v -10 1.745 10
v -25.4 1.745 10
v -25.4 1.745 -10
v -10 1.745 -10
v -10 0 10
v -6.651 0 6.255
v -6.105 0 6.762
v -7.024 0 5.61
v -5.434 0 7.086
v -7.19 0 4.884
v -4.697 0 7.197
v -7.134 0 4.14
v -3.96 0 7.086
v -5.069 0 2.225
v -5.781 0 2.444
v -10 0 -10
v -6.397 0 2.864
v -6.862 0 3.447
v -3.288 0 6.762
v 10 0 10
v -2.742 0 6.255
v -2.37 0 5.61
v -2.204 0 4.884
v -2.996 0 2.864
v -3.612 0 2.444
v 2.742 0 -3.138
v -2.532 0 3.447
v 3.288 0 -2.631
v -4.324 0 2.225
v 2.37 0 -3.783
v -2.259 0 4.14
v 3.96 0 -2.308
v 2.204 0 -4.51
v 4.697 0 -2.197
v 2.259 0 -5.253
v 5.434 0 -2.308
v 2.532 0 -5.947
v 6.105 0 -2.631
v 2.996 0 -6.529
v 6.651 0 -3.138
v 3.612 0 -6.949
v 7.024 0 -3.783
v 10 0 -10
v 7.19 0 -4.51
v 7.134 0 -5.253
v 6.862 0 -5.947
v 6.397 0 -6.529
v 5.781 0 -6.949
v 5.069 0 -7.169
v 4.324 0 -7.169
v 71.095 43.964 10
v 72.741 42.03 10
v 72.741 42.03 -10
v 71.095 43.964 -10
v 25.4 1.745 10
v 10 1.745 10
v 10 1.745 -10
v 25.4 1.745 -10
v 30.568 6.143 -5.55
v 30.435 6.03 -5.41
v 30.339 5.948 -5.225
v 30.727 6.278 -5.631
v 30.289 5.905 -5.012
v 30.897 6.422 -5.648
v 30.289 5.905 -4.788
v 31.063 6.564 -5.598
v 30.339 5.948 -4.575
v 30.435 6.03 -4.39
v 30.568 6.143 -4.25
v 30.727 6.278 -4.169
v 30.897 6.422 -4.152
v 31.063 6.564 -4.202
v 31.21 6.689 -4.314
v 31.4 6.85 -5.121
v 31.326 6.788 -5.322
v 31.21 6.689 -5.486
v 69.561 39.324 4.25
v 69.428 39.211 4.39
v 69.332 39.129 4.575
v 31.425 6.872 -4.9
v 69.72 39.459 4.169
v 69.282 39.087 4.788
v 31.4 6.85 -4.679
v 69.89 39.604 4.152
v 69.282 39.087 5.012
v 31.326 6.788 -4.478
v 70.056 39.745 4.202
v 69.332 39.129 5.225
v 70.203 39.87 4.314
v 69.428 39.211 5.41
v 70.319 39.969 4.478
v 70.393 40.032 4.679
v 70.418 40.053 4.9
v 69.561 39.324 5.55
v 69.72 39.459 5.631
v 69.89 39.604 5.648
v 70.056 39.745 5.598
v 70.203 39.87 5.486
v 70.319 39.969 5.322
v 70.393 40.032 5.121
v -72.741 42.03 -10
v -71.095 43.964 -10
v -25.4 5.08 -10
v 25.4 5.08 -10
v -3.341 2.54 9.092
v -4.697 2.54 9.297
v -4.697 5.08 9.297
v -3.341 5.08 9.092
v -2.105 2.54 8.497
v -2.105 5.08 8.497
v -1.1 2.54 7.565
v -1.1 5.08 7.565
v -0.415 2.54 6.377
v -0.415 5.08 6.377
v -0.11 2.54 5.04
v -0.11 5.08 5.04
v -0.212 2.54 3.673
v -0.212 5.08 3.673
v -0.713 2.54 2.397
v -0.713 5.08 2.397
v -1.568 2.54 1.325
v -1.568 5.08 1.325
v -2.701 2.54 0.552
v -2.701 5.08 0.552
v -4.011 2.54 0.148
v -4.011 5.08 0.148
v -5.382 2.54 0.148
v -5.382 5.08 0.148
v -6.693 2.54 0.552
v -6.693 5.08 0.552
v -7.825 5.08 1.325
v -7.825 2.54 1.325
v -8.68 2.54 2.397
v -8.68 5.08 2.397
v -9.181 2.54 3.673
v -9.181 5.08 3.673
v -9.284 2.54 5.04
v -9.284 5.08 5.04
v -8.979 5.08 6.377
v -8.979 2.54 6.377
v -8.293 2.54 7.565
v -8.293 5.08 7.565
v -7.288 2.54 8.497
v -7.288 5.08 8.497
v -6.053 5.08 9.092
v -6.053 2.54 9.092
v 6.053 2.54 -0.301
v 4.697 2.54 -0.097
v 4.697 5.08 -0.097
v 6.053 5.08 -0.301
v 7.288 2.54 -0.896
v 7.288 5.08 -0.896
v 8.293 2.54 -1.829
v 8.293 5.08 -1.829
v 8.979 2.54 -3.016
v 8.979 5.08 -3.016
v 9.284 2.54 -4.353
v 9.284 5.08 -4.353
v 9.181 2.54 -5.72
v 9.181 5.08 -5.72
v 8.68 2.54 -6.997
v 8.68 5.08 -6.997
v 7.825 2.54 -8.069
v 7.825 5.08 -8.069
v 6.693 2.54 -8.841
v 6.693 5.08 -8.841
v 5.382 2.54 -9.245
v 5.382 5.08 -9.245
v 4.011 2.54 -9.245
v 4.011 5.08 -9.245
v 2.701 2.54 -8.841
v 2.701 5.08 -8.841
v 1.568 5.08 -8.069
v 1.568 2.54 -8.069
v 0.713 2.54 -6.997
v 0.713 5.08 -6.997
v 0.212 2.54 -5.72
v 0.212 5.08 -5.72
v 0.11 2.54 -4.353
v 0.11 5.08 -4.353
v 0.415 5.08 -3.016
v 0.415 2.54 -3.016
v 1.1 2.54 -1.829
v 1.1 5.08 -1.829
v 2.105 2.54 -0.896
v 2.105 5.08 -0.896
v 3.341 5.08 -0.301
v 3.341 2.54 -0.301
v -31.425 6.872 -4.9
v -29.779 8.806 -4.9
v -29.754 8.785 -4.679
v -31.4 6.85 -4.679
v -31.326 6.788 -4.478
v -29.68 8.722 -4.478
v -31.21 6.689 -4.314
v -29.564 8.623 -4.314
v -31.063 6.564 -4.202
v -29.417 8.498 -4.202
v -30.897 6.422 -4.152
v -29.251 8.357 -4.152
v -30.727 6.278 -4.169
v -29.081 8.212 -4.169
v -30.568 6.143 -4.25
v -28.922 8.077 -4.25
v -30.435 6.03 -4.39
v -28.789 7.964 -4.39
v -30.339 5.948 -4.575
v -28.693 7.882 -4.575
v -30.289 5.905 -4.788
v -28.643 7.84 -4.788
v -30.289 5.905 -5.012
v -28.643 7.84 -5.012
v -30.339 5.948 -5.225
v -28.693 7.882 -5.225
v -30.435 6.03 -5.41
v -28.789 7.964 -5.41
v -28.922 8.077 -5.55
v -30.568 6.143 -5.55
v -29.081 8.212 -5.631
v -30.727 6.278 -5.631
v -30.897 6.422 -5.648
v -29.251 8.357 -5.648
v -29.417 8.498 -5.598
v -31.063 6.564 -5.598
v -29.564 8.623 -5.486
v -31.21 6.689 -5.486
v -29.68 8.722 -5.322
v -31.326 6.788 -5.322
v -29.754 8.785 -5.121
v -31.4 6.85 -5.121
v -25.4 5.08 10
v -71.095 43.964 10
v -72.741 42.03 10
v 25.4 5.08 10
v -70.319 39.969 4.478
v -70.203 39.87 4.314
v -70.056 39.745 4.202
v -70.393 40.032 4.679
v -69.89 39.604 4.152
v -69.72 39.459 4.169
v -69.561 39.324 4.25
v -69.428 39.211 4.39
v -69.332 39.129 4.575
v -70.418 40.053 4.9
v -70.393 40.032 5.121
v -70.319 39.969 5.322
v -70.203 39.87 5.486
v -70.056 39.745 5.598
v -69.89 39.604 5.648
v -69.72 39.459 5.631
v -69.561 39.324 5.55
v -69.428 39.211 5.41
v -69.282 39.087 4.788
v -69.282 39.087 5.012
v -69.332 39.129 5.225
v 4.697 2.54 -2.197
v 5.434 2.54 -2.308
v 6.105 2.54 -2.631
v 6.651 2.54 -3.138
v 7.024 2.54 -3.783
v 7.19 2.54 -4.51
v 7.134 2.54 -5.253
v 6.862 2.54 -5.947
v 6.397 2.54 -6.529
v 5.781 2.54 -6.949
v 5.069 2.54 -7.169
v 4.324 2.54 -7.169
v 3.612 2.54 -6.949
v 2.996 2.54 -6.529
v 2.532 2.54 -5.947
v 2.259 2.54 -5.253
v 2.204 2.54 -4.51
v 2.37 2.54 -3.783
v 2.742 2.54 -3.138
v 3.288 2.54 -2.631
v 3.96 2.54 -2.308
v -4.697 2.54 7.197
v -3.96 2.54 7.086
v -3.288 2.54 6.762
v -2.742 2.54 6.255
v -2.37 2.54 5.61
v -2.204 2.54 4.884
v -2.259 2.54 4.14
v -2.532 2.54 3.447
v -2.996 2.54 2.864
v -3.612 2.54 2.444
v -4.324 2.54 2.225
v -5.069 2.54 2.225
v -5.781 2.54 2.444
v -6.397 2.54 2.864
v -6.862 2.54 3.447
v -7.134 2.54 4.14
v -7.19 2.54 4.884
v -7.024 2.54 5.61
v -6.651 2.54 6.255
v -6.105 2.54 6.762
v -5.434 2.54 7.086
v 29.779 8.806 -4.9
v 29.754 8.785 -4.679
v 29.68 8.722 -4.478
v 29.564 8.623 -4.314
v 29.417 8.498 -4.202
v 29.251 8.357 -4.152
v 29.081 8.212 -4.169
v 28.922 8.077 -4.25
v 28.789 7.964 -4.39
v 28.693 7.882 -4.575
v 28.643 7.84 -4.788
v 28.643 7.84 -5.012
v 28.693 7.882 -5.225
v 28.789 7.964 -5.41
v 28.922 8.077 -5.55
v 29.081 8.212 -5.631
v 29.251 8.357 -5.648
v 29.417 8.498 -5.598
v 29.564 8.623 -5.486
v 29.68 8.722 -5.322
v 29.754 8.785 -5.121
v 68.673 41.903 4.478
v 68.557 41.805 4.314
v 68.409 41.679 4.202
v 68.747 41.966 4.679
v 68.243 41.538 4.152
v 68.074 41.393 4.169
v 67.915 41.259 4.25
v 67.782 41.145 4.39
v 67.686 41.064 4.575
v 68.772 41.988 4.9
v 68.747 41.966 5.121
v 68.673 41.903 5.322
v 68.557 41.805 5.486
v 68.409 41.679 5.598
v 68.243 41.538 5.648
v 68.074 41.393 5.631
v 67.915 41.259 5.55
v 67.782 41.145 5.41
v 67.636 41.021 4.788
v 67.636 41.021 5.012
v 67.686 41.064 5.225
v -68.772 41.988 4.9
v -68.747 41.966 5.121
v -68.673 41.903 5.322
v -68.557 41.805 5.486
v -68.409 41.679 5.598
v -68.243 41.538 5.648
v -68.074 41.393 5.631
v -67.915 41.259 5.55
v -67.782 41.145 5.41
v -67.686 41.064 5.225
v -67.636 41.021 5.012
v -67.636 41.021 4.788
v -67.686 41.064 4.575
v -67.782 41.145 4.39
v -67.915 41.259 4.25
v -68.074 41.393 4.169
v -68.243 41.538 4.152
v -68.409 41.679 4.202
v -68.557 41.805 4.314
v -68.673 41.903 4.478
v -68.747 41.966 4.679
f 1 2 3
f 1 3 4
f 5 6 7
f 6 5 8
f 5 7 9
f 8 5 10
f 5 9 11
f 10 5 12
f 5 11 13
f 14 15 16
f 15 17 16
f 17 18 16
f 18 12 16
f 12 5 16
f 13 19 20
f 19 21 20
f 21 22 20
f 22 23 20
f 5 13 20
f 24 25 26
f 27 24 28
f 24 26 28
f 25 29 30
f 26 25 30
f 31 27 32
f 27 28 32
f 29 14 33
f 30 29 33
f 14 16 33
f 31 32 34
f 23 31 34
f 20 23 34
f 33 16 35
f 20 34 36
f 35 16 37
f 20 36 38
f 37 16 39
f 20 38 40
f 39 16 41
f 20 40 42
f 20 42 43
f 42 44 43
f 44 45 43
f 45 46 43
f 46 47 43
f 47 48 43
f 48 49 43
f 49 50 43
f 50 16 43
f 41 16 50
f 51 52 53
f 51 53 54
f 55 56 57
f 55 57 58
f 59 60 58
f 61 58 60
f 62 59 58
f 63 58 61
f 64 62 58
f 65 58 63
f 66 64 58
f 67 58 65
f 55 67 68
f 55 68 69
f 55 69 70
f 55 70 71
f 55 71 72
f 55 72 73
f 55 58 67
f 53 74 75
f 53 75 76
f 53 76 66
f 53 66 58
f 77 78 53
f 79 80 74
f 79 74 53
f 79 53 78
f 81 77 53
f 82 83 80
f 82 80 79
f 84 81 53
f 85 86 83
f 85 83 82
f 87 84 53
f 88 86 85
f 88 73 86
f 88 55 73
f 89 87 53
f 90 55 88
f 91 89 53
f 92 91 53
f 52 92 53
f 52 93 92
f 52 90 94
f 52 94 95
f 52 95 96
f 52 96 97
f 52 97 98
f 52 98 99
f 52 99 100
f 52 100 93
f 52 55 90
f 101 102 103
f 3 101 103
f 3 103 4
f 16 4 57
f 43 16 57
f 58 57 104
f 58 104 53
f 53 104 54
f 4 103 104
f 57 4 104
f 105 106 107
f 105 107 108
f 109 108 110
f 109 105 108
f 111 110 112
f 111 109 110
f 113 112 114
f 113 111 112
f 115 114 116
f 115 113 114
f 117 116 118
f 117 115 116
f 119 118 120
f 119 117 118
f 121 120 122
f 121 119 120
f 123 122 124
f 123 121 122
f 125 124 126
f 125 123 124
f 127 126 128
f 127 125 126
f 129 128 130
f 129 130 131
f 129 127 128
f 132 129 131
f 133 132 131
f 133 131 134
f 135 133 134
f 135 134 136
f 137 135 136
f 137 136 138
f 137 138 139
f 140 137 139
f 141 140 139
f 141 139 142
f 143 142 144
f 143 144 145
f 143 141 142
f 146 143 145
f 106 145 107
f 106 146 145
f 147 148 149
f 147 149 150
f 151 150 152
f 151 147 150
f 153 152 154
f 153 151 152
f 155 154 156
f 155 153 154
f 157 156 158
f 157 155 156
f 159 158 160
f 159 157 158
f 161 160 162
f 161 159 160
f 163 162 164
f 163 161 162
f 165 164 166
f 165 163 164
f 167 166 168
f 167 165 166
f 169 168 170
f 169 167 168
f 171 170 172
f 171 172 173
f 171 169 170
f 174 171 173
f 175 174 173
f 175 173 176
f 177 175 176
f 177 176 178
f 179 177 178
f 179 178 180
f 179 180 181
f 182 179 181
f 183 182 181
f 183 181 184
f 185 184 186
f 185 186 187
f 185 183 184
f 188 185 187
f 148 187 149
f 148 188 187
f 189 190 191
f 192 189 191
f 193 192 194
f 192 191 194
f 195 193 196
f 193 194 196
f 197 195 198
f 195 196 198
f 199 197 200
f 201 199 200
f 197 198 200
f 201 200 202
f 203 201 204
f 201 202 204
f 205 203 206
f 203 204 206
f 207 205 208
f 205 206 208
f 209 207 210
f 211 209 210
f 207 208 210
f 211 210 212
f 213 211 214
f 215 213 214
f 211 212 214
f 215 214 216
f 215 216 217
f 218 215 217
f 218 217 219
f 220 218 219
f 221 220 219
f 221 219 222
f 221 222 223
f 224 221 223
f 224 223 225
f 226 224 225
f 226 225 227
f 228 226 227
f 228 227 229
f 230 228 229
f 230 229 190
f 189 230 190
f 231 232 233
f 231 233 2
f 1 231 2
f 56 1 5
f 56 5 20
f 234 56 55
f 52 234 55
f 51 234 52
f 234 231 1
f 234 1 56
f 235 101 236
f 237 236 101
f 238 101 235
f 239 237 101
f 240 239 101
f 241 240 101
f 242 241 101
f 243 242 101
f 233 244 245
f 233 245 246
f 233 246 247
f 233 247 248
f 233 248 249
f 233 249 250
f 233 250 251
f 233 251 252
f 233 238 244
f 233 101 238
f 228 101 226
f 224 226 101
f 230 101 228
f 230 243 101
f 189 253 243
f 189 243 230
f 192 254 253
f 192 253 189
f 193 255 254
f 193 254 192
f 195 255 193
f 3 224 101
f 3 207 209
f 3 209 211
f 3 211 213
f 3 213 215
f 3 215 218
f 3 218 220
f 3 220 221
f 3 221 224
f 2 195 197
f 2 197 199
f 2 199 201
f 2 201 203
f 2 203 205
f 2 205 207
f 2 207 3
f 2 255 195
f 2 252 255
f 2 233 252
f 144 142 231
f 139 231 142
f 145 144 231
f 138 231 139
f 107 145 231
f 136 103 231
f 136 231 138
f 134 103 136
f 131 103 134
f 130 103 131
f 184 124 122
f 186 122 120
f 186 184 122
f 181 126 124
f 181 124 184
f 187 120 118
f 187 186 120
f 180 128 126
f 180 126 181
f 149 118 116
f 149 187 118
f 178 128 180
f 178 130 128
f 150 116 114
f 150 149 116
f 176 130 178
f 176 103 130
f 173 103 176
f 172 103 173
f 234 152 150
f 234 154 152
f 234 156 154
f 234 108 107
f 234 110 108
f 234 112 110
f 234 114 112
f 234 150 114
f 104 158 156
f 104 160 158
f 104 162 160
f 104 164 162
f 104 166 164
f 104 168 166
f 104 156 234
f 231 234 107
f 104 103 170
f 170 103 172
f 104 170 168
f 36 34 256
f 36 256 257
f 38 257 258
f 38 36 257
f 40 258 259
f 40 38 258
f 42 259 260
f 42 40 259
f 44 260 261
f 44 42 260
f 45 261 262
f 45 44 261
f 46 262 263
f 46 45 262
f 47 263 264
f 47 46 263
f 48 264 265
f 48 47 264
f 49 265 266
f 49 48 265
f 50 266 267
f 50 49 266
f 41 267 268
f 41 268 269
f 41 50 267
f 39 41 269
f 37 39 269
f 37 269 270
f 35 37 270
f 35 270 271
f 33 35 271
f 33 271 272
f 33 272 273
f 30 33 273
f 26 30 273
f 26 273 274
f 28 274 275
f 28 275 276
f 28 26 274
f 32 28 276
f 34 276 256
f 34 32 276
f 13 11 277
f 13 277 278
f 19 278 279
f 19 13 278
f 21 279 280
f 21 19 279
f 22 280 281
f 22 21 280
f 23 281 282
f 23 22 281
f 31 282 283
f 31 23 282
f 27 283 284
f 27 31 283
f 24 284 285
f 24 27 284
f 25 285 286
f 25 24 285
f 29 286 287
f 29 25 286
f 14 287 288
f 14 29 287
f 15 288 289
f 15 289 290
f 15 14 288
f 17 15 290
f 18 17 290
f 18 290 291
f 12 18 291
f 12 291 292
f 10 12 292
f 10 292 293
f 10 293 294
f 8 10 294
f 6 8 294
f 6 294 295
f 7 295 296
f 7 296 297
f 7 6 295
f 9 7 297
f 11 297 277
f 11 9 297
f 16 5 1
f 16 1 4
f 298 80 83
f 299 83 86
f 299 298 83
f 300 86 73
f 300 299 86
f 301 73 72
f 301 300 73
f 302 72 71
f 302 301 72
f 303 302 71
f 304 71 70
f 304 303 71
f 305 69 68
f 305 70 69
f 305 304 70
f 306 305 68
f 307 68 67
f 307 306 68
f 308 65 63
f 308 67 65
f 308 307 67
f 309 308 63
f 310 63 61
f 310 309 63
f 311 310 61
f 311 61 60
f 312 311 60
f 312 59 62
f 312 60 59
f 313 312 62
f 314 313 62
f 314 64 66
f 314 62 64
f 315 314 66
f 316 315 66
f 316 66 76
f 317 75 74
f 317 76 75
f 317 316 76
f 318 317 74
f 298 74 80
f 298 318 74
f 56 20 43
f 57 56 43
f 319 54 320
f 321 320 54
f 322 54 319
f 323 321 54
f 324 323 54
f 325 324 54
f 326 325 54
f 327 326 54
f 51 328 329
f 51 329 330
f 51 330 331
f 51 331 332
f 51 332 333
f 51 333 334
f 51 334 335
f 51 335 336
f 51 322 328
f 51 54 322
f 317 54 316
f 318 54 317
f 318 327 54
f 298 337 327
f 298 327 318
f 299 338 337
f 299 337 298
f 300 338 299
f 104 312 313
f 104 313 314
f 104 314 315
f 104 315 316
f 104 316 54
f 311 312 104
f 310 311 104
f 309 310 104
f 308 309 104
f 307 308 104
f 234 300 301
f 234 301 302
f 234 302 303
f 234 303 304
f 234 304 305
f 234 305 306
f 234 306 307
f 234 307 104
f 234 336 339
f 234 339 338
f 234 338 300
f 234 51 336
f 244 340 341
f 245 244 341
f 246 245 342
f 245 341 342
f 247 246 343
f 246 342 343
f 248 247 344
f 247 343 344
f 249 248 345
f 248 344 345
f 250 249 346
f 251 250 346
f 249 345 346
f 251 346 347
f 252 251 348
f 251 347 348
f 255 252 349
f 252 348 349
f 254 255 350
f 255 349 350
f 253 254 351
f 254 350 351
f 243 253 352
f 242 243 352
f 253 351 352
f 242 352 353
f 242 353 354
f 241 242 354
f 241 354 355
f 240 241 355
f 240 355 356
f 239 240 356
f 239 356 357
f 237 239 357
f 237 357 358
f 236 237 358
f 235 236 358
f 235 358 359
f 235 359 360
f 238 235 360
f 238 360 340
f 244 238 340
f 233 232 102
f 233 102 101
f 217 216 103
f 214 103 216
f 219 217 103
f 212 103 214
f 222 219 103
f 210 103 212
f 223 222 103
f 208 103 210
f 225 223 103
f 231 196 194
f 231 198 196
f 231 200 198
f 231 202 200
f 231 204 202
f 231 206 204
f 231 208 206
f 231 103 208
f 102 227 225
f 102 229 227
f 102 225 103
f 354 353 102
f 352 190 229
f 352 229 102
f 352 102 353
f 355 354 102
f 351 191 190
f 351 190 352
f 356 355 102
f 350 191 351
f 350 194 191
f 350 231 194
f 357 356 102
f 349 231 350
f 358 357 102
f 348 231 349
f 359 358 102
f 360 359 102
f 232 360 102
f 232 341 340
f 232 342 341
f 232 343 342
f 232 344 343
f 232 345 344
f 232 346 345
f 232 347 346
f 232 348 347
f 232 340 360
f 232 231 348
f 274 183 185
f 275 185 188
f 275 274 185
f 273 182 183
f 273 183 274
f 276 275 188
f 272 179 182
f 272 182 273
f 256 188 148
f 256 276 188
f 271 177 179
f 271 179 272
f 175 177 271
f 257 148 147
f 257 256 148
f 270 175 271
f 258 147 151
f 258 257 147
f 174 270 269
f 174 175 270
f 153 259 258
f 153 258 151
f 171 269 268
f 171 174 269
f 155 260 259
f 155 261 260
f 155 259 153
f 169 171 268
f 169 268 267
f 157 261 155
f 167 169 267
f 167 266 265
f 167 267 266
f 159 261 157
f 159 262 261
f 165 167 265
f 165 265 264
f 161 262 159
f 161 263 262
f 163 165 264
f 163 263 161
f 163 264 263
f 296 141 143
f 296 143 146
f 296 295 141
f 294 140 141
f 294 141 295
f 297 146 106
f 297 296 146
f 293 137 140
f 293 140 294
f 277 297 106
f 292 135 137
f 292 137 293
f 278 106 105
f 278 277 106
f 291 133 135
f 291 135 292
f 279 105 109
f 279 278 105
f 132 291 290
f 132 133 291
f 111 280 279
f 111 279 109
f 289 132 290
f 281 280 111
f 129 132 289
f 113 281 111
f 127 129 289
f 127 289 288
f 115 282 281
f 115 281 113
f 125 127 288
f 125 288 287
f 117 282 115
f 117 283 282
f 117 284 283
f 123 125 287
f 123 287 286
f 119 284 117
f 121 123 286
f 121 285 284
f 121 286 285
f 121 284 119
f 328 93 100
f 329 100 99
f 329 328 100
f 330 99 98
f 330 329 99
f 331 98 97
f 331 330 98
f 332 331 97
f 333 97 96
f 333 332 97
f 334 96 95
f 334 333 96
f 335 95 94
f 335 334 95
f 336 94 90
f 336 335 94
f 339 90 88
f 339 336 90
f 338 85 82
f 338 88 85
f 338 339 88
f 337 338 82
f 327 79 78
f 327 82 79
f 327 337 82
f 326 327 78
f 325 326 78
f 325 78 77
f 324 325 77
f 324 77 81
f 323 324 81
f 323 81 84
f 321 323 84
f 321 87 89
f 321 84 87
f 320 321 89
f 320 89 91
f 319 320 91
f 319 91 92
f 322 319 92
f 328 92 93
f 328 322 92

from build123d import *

# Parameters (mm, degrees)
SKETCH1_W           = 20
SKETCH1_H           = 20
SKETCH1_R           = 2.5
BOSS_EXTRUDE1_DEPTH = 2.54
SKETCH2_W           = 15.4
SKETCH2_H           = 20
SKETCH2_W_2         = 20
SKETCH2_R           = 4.6
BOSS_EXTRUDE2_DEPTH = 2.54
BOSS_EXTRUDE3_DEPTH = 20
SKETCH4_R           = 0.75
CUT_EXTRUDE1_DEPTH  = 257.103477181


with BuildPart() as part:
    # Sketch1 → Boss-Extrude1 (new body)
    with BuildSketch(Plane(origin=(0, 0, 0), x_dir=(1, 0, 0), z_dir=(0, 1, 0))):
        Rectangle(SKETCH1_W, SKETCH1_H)
        with Locations(Location((4.696699141, 4.696699141, 0), (0, 0, 270))):
            Circle(SKETCH1_R, mode=Mode.SUBTRACT)
        with Locations(Location((-4.696699141, -4.696699141, 0), (0, 0, 270))):
            Circle(SKETCH1_R, mode=Mode.SUBTRACT)
    extrude(amount=BOSS_EXTRUDE1_DEPTH)

    # Sketch2 → Boss-Extrude2 (add)
    # profile 1 of 3: a face of its own
    with BuildSketch(Plane(origin=(0, 2.54, 0), x_dir=(1, 0, 0), z_dir=(0, 1, 0))):
        with Locations((-17.7, 0)):
            Rectangle(SKETCH2_W, SKETCH2_H)
    # profile 2 of 3: a face of its own
    with BuildSketch(Plane(origin=(0, 2.54, 0), x_dir=(1, 0, 0), z_dir=(0, 1, 0))):
        Rectangle(SKETCH2_W_2, SKETCH2_H)
        with Locations(Location((-4.696699141, -4.696699141, 0), (0, 0, 270))):
            Circle(SKETCH2_R, mode=Mode.SUBTRACT)
        with Locations(Location((4.696699141, 4.696699141, 0), (0, 0, 270))):
            Circle(SKETCH2_R, mode=Mode.SUBTRACT)
    # profile 3 of 3: a face of its own
    with BuildSketch(Plane(origin=(0, 2.54, 0), x_dir=(1, 0, 0), z_dir=(0, 1, 0))):
        with Locations((17.7, 0)):
            Rectangle(SKETCH2_W, SKETCH2_H)
    extrude(amount=BOSS_EXTRUDE2_DEPTH)

    # Sketch3 → Boss-Extrude3 (add)
    with BuildSketch(Plane.XY.offset(10)):
        Polygon((-25.4, 2.54), (-25.4, 5.08), (-71.094747123, 43.964316702), (-72.740849863, 42.02990574), (-25.4, 1.744824524), (-10, 1.744824524), (-10, 2.54), align=None)
        Polygon((71.094747123, 43.964316702), (25.4, 5.08), (25.4, 2.54), (10, 2.54), (10, 1.744824524), (25.4, 1.744824524), (72.740849863, 42.02990574), align=None)
    extrude(amount=-BOSS_EXTRUDE3_DEPTH)

    # Sketch4 → Cut-Extrude1 (cut)
    with BuildSketch(Plane(origin=(-8.160655098, -9.589960753, 0), x_dir=(0.7615791187140926, -0.6480719450328537, 0), z_dir=(0.6480719450328537, 0.7615791187140926, 0))):
        with Locations(Location((-27.636315096, 4.9, 0), (0, 0, 180))):
            Circle(SKETCH4_R)
        with Locations(Location((-78.836315096, -4.9, 0), (0, 0, 180))):
            Circle(SKETCH4_R)
    cut_extrude1 = extrude(amount=-CUT_EXTRUDE1_DEPTH, mode=Mode.SUBTRACT)

    # Mirror1: Cut-Extrude1 across plane
    add(cut_extrude1.mirror(Plane(origin=(0, 0, 0), x_dir=(0, 0, 1), z_dir=(1, 0, 0))), mode=Mode.SUBTRACT)


solid = part.part
